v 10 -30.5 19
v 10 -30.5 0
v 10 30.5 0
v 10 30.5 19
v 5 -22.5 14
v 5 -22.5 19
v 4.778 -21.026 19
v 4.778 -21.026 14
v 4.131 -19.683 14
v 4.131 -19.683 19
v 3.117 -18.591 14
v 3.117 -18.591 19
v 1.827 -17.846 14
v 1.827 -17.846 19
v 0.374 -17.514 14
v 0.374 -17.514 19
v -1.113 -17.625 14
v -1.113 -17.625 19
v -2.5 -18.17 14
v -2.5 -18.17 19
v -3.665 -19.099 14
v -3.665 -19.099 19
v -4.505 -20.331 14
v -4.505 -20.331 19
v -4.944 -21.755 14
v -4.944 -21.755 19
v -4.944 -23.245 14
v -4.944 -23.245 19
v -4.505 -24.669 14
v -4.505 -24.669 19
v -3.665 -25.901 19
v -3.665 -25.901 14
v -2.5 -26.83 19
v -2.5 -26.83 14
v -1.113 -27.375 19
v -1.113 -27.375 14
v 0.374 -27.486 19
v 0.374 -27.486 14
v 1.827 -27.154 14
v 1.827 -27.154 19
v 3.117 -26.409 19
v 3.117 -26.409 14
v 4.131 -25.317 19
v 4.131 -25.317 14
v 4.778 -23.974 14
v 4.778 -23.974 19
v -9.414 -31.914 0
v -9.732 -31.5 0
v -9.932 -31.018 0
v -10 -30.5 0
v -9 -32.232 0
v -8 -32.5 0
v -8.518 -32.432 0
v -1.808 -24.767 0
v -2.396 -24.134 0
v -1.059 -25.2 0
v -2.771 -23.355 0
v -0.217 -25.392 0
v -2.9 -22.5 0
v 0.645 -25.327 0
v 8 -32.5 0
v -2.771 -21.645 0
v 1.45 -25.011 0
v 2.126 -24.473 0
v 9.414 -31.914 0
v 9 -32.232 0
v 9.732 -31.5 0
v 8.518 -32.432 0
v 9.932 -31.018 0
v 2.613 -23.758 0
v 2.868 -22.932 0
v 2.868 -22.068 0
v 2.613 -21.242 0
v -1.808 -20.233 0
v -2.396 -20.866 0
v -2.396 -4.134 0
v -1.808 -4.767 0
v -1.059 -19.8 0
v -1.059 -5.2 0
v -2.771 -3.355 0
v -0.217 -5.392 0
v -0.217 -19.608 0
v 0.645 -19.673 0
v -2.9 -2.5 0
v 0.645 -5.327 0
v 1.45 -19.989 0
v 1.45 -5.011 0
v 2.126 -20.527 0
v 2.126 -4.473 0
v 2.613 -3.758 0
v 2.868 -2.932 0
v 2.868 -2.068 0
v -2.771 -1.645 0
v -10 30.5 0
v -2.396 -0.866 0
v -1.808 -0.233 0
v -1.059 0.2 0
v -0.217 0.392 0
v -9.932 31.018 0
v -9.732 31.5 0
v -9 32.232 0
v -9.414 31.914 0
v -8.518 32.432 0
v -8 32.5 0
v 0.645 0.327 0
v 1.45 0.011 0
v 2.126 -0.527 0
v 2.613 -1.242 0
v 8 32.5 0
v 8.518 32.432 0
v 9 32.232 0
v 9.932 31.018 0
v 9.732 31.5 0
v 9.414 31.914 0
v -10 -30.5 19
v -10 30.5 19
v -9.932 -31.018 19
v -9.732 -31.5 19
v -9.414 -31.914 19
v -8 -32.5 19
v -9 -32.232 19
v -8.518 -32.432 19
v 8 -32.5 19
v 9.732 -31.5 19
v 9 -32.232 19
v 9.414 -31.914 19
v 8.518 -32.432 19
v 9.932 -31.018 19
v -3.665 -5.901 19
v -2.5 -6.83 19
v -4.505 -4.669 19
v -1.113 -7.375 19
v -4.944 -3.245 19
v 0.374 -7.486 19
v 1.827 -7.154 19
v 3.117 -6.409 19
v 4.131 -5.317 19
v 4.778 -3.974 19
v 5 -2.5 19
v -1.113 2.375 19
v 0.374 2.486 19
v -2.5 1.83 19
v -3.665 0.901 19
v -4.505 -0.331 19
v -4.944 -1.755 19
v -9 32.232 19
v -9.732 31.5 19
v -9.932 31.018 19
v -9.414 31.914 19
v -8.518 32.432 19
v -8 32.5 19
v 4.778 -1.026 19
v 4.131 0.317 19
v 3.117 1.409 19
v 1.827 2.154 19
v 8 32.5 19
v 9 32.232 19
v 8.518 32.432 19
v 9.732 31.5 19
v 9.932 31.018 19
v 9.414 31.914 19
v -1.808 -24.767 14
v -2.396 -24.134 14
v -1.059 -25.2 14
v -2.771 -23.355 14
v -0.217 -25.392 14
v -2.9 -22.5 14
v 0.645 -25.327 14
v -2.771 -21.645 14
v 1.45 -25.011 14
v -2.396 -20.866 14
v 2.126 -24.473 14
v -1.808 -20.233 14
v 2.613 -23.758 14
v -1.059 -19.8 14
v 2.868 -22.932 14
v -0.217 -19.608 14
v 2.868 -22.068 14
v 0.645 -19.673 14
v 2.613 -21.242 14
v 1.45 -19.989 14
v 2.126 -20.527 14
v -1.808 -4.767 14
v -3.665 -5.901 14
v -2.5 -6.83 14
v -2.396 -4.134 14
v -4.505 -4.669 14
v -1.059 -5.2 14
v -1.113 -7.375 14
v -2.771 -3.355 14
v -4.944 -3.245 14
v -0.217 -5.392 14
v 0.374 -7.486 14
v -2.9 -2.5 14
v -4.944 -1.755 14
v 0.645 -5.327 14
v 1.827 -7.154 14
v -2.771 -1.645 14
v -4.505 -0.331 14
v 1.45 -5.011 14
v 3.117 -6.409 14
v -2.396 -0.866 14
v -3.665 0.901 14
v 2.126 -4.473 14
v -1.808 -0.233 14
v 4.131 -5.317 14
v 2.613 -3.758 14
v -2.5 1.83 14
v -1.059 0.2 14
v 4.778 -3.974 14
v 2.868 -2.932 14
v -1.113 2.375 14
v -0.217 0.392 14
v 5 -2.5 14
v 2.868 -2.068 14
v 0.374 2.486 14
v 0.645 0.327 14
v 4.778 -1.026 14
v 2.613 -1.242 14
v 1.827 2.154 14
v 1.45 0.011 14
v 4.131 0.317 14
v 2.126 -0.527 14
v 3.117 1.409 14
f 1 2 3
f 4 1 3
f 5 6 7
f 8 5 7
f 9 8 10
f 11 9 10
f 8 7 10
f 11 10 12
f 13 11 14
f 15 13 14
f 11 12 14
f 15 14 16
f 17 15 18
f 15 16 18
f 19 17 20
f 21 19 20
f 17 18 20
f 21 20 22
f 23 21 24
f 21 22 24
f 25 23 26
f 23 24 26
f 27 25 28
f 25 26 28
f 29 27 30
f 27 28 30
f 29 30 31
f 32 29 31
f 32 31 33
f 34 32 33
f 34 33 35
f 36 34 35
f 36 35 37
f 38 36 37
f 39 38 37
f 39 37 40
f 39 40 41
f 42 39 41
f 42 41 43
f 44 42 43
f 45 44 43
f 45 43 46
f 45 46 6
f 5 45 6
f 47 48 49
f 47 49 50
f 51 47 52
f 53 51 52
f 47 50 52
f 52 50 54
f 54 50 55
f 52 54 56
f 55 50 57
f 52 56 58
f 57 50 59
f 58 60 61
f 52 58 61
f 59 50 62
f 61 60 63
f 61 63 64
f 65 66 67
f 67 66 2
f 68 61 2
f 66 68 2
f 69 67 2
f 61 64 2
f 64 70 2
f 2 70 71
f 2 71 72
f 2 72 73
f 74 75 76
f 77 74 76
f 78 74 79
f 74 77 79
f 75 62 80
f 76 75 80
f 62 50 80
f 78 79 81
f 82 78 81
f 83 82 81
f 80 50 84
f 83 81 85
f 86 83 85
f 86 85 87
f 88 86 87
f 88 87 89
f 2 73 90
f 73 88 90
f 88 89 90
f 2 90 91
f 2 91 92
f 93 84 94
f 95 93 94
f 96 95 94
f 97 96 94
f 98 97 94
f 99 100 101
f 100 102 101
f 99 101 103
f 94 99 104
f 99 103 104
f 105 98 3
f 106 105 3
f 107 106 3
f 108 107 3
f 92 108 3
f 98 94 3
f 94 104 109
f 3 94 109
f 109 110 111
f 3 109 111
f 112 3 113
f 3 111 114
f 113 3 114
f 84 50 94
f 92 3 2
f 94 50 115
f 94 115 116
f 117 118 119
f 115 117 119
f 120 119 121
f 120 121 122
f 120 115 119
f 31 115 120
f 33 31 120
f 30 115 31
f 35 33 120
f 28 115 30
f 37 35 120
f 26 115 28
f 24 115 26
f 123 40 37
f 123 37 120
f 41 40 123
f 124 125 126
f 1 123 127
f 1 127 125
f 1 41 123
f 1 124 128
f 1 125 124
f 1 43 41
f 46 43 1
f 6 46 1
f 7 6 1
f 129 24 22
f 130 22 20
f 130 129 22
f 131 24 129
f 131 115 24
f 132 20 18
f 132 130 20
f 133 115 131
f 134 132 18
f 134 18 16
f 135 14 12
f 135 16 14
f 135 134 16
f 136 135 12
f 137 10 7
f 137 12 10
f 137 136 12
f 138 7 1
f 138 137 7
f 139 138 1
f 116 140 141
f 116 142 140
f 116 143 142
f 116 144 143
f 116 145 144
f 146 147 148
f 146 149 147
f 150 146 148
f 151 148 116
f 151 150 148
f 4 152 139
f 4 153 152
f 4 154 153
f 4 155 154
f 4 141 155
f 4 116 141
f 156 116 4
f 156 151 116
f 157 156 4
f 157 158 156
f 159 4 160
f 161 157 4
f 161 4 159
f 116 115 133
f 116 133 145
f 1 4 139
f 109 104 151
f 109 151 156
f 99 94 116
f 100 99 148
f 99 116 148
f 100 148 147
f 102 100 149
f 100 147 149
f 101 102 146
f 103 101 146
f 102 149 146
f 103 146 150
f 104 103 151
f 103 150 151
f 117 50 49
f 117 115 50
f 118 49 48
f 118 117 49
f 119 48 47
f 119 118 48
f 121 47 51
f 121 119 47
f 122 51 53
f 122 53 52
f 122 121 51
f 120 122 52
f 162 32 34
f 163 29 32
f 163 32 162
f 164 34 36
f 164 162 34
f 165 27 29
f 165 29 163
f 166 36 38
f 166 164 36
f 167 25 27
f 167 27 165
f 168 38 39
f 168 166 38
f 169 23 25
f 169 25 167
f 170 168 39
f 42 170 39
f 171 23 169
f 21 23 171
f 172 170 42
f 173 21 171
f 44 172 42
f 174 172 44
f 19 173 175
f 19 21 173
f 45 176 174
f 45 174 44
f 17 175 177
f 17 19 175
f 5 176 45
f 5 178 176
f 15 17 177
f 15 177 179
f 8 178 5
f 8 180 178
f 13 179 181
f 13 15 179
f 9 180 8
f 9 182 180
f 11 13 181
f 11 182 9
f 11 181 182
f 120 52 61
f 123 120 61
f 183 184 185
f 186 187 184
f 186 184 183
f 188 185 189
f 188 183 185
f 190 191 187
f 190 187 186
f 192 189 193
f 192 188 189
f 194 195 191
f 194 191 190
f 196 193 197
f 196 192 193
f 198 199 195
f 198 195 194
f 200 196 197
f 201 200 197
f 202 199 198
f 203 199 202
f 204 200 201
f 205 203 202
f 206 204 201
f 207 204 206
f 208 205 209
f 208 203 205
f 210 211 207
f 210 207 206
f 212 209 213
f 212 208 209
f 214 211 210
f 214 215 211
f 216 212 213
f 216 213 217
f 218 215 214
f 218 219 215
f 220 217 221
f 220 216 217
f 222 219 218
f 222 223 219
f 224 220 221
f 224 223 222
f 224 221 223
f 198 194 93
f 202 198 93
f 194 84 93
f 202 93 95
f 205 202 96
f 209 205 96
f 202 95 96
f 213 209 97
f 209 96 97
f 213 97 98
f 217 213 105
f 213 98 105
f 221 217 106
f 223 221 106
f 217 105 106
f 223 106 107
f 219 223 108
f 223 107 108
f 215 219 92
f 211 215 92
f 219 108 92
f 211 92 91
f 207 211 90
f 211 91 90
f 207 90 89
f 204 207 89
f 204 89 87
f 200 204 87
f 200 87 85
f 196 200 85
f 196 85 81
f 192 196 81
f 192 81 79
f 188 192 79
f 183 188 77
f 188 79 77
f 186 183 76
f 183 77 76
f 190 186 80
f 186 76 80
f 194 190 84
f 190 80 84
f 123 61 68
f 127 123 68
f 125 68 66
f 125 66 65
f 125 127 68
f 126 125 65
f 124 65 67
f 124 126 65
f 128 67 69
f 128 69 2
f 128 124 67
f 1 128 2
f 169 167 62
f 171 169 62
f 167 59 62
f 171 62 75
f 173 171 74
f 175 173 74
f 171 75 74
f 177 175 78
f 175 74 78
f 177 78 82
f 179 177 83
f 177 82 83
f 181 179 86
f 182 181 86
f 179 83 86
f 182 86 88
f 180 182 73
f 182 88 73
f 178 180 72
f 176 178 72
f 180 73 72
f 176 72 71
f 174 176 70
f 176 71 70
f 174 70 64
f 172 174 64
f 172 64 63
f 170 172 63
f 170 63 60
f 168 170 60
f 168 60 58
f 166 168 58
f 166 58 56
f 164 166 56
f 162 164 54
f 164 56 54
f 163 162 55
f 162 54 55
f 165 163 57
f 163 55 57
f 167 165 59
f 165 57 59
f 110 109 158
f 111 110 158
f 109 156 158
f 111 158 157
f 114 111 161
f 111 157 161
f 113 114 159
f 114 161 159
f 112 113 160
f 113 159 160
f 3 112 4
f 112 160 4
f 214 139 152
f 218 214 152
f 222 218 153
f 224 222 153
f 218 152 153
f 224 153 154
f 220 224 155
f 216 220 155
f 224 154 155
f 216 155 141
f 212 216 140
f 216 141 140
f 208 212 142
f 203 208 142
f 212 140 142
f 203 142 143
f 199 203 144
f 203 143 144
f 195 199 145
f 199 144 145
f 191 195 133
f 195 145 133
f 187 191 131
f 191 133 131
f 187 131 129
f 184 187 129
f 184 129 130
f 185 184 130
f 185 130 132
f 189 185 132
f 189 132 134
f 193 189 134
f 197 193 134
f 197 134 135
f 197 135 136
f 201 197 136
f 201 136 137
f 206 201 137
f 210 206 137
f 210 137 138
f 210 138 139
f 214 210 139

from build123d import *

# Parameters (mm, degrees)
SKETCH1_W                      = 20
SKETCH1_H                      = 65
BOSS_EXTRUDE1_DEPTH            = 19
CBORE_FOR_M5_SHCS1_D           = 5.8
CBORE_FOR_M5_SHCS1_CBORE_D     = 10
CBORE_FOR_M5_SHCS1_CBORE_DEPTH = 5
FILLET1_R                      = 2


with BuildPart() as part:
    # Sketch1 → Boss-Extrude1 (new body)
    with BuildSketch(Plane.XY):
        Rectangle(SKETCH1_W, SKETCH1_H)
    extrude(amount=BOSS_EXTRUDE1_DEPTH)

    # CBORE for M5 SHCS1 (through all)
    with Locations(Plane.XY.offset(19)):
        with Locations((0, -2.5), (0, -22.5)):
            CounterBoreHole(CBORE_FOR_M5_SHCS1_D / 2, CBORE_FOR_M5_SHCS1_CBORE_D / 2, CBORE_FOR_M5_SHCS1_CBORE_DEPTH)

    # Fillet1
    fillet1_edges = [part.edges().sort_by_distance(p)[0] for p in [
        (10, -32.5, 9.5),
        (-10, -32.5, 9.5),
        (-10, 32.5, 9.5),
        (10, 32.5, 9.5),
    ]]
    fillet(fillet1_edges, radius=FILLET1_R)


solid = part.part
